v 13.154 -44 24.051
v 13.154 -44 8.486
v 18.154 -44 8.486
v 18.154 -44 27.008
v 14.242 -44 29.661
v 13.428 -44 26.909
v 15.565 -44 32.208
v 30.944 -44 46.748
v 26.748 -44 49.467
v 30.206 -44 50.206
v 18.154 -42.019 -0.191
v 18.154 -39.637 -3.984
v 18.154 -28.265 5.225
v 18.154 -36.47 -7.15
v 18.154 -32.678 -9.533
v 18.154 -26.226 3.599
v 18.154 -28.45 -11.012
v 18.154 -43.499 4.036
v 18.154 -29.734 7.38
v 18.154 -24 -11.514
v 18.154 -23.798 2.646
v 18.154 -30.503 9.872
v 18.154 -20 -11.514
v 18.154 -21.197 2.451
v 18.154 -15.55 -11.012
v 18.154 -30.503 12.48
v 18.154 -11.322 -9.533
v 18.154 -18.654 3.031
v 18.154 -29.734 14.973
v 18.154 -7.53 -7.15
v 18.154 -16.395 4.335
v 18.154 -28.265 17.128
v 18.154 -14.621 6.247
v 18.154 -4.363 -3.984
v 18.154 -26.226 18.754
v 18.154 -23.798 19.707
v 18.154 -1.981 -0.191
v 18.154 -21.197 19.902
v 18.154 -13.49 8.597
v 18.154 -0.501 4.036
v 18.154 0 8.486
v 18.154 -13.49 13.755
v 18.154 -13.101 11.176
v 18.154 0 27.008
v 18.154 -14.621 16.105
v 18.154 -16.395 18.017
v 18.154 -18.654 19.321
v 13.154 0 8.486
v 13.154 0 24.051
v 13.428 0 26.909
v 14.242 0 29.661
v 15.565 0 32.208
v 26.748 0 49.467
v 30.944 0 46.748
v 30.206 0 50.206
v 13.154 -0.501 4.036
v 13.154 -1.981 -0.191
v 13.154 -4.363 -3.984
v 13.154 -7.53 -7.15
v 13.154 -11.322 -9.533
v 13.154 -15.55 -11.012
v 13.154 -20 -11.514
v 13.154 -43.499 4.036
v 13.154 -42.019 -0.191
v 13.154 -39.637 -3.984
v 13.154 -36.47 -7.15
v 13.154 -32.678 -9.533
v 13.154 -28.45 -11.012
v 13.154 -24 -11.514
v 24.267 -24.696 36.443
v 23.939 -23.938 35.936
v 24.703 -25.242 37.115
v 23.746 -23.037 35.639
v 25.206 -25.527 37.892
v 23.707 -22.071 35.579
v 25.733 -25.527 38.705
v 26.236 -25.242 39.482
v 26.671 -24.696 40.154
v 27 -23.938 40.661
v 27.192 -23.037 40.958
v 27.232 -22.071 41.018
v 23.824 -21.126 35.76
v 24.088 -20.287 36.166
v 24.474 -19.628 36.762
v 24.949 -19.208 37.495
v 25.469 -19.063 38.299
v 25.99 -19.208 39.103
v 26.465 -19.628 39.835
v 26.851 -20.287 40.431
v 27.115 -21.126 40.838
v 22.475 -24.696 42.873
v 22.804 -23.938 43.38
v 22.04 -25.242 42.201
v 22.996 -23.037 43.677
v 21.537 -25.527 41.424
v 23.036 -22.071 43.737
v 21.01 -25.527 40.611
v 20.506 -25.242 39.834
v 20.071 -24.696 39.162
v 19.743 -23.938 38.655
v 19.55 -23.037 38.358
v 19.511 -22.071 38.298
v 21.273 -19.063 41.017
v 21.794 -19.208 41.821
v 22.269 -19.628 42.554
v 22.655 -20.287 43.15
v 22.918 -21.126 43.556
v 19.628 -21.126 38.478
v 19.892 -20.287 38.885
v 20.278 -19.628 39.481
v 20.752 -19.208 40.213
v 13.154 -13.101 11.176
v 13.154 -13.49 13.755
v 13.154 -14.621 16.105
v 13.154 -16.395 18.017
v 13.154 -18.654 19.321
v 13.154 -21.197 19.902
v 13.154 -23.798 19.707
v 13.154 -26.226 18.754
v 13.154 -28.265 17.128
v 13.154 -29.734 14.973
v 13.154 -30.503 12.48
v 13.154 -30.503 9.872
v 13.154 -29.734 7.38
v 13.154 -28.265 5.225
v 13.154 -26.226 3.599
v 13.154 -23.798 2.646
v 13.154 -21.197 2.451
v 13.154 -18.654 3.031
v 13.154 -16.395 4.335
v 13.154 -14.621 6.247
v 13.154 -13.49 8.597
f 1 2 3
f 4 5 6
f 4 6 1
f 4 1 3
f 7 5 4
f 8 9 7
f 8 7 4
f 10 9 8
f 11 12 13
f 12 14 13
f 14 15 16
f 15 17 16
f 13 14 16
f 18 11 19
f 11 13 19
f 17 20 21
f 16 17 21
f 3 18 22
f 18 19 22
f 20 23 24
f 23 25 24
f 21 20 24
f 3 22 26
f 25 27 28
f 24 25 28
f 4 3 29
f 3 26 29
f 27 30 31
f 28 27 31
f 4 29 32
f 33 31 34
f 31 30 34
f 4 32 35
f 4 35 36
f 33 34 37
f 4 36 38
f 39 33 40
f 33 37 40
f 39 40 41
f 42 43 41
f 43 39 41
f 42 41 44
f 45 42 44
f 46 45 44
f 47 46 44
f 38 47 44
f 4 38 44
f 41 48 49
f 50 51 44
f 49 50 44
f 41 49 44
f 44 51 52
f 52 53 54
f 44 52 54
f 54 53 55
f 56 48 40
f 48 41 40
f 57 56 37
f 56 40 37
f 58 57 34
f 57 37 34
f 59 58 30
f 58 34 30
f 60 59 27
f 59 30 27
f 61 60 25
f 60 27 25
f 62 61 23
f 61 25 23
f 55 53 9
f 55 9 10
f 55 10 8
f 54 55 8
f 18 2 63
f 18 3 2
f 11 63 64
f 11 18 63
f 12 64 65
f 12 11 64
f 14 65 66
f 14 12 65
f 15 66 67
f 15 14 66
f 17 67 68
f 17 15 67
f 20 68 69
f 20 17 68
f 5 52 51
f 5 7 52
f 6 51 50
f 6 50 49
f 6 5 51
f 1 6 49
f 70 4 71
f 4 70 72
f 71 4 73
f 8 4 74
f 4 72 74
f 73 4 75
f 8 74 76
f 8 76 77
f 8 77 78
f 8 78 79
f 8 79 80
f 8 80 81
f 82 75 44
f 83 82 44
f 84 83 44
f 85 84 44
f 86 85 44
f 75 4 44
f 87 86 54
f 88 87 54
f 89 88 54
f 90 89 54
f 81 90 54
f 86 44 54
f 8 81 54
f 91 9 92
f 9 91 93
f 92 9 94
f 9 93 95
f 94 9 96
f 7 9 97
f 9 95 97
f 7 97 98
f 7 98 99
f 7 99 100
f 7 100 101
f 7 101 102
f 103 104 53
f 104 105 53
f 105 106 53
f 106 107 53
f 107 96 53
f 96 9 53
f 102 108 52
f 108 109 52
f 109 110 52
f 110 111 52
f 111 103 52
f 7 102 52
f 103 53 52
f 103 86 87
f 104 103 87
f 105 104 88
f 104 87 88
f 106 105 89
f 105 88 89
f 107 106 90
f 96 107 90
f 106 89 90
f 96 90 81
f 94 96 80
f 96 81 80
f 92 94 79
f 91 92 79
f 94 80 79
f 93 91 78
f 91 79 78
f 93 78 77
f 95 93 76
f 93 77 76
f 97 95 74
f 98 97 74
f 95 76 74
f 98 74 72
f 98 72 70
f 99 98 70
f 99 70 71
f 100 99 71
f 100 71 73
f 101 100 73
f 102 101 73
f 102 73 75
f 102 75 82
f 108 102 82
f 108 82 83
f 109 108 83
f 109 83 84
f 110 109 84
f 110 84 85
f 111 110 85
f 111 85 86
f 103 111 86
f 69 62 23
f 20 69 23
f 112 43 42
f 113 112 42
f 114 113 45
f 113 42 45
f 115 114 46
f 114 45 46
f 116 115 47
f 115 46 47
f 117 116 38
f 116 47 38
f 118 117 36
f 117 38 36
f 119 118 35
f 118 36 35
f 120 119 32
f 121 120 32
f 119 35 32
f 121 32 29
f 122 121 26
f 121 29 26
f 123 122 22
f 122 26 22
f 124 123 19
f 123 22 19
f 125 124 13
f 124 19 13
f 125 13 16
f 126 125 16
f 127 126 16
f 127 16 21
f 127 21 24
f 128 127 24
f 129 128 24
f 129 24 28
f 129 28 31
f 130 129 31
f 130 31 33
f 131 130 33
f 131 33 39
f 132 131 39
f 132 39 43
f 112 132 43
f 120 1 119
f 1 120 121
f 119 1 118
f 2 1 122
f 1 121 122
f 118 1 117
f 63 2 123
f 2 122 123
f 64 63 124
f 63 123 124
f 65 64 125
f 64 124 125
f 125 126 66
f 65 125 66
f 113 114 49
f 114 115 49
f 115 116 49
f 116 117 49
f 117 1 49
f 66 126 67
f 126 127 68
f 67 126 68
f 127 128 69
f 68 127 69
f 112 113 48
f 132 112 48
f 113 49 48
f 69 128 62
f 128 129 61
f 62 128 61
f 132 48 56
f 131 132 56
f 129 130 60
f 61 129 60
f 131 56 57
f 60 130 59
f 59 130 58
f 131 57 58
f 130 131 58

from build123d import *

# Parameters (mm, degrees)
F1_DEPTH    = 44
F2_R        = 15
F3_T1_DEPTH = 69.7168298797
F4_R        = 20
F5_R        = 8.75
F6_DEPTH    = 25
F7_R        = 3.25
F8_DEPTH    = 25


# Not quite as in the source:
# - a fillet or chamfer that OpenCascade refuses, or shapes differently, is made with other operations: its cross-section is extruded or revolved along the edge and cut away or added


with BuildPart() as f1:
    # F0 (on Front) → F1 (new body)
    with BuildSketch(Plane.XZ):
        Polygon((29.4669866014, 53.6632488984), (13.1538538262, 28.4862415493), (13.1538538262, -11.5137584507), (18.1538538262, -11.5137584507), (18.1538538262, 27.0079869683), (33.6631544929, 50.9443934359), align=None)
    extrude(amount=F1_DEPTH)

    # F2
    f2_edges = [f1.edges().sort_by_distance(p)[0] for p in [
        (13.153854, -22, 28.486242),
    ]]
    fillet(f2_edges, radius=F2_R)

    # F3: chamfer of 5 on 2 edges, made by hand

    # F3_s2 → F3_t1 (cut)
    with BuildSketch(Plane.XZ.offset(-12.8584149398)):
        Polygon((26.7481311389, 49.4670810069), (33.6631544929, 50.9443934359), (29.4669866014, 53.6632488984), align=None)
        Polygon((29.4669866014, 53.6632488984), (30.9442990304, 46.7482255444), (33.6631544929, 50.9443934359), align=None)
    extrude(amount=F3_T1_DEPTH, mode=Mode.SUBTRACT)

    # F4
    f4_edges = [f1.edges().sort_by_distance(p)[0] for p in [
        (15.653854, -44, -11.513758),
        (15.653854, 0, -11.513758),
    ]]
    fillet(f4_edges, radius=F4_R)

    # F5 (on face) → F6 (cut)
    with BuildSketch(Plane.YZ.offset(18.1538538262)):
        with Locations((-21.8509025872, 11.1763291061)):
            Circle(F5_R)
    extrude(amount=-F6_DEPTH, mode=Mode.SUBTRACT)

    # F7 (on face) → F8 (cut)
    with BuildSketch(Plane(origin=(0.4608744572, 0, -0.2986179457), x_dir=(0, 1, 0), z_dir=(0.8392335783, 0, -0.5437710925))):
        with Locations((-22.313432768, 45.9909811616)):
            Circle(F7_R)
    extrude(amount=-F8_DEPTH, mode=Mode.SUBTRACT)


solid = f1.part
